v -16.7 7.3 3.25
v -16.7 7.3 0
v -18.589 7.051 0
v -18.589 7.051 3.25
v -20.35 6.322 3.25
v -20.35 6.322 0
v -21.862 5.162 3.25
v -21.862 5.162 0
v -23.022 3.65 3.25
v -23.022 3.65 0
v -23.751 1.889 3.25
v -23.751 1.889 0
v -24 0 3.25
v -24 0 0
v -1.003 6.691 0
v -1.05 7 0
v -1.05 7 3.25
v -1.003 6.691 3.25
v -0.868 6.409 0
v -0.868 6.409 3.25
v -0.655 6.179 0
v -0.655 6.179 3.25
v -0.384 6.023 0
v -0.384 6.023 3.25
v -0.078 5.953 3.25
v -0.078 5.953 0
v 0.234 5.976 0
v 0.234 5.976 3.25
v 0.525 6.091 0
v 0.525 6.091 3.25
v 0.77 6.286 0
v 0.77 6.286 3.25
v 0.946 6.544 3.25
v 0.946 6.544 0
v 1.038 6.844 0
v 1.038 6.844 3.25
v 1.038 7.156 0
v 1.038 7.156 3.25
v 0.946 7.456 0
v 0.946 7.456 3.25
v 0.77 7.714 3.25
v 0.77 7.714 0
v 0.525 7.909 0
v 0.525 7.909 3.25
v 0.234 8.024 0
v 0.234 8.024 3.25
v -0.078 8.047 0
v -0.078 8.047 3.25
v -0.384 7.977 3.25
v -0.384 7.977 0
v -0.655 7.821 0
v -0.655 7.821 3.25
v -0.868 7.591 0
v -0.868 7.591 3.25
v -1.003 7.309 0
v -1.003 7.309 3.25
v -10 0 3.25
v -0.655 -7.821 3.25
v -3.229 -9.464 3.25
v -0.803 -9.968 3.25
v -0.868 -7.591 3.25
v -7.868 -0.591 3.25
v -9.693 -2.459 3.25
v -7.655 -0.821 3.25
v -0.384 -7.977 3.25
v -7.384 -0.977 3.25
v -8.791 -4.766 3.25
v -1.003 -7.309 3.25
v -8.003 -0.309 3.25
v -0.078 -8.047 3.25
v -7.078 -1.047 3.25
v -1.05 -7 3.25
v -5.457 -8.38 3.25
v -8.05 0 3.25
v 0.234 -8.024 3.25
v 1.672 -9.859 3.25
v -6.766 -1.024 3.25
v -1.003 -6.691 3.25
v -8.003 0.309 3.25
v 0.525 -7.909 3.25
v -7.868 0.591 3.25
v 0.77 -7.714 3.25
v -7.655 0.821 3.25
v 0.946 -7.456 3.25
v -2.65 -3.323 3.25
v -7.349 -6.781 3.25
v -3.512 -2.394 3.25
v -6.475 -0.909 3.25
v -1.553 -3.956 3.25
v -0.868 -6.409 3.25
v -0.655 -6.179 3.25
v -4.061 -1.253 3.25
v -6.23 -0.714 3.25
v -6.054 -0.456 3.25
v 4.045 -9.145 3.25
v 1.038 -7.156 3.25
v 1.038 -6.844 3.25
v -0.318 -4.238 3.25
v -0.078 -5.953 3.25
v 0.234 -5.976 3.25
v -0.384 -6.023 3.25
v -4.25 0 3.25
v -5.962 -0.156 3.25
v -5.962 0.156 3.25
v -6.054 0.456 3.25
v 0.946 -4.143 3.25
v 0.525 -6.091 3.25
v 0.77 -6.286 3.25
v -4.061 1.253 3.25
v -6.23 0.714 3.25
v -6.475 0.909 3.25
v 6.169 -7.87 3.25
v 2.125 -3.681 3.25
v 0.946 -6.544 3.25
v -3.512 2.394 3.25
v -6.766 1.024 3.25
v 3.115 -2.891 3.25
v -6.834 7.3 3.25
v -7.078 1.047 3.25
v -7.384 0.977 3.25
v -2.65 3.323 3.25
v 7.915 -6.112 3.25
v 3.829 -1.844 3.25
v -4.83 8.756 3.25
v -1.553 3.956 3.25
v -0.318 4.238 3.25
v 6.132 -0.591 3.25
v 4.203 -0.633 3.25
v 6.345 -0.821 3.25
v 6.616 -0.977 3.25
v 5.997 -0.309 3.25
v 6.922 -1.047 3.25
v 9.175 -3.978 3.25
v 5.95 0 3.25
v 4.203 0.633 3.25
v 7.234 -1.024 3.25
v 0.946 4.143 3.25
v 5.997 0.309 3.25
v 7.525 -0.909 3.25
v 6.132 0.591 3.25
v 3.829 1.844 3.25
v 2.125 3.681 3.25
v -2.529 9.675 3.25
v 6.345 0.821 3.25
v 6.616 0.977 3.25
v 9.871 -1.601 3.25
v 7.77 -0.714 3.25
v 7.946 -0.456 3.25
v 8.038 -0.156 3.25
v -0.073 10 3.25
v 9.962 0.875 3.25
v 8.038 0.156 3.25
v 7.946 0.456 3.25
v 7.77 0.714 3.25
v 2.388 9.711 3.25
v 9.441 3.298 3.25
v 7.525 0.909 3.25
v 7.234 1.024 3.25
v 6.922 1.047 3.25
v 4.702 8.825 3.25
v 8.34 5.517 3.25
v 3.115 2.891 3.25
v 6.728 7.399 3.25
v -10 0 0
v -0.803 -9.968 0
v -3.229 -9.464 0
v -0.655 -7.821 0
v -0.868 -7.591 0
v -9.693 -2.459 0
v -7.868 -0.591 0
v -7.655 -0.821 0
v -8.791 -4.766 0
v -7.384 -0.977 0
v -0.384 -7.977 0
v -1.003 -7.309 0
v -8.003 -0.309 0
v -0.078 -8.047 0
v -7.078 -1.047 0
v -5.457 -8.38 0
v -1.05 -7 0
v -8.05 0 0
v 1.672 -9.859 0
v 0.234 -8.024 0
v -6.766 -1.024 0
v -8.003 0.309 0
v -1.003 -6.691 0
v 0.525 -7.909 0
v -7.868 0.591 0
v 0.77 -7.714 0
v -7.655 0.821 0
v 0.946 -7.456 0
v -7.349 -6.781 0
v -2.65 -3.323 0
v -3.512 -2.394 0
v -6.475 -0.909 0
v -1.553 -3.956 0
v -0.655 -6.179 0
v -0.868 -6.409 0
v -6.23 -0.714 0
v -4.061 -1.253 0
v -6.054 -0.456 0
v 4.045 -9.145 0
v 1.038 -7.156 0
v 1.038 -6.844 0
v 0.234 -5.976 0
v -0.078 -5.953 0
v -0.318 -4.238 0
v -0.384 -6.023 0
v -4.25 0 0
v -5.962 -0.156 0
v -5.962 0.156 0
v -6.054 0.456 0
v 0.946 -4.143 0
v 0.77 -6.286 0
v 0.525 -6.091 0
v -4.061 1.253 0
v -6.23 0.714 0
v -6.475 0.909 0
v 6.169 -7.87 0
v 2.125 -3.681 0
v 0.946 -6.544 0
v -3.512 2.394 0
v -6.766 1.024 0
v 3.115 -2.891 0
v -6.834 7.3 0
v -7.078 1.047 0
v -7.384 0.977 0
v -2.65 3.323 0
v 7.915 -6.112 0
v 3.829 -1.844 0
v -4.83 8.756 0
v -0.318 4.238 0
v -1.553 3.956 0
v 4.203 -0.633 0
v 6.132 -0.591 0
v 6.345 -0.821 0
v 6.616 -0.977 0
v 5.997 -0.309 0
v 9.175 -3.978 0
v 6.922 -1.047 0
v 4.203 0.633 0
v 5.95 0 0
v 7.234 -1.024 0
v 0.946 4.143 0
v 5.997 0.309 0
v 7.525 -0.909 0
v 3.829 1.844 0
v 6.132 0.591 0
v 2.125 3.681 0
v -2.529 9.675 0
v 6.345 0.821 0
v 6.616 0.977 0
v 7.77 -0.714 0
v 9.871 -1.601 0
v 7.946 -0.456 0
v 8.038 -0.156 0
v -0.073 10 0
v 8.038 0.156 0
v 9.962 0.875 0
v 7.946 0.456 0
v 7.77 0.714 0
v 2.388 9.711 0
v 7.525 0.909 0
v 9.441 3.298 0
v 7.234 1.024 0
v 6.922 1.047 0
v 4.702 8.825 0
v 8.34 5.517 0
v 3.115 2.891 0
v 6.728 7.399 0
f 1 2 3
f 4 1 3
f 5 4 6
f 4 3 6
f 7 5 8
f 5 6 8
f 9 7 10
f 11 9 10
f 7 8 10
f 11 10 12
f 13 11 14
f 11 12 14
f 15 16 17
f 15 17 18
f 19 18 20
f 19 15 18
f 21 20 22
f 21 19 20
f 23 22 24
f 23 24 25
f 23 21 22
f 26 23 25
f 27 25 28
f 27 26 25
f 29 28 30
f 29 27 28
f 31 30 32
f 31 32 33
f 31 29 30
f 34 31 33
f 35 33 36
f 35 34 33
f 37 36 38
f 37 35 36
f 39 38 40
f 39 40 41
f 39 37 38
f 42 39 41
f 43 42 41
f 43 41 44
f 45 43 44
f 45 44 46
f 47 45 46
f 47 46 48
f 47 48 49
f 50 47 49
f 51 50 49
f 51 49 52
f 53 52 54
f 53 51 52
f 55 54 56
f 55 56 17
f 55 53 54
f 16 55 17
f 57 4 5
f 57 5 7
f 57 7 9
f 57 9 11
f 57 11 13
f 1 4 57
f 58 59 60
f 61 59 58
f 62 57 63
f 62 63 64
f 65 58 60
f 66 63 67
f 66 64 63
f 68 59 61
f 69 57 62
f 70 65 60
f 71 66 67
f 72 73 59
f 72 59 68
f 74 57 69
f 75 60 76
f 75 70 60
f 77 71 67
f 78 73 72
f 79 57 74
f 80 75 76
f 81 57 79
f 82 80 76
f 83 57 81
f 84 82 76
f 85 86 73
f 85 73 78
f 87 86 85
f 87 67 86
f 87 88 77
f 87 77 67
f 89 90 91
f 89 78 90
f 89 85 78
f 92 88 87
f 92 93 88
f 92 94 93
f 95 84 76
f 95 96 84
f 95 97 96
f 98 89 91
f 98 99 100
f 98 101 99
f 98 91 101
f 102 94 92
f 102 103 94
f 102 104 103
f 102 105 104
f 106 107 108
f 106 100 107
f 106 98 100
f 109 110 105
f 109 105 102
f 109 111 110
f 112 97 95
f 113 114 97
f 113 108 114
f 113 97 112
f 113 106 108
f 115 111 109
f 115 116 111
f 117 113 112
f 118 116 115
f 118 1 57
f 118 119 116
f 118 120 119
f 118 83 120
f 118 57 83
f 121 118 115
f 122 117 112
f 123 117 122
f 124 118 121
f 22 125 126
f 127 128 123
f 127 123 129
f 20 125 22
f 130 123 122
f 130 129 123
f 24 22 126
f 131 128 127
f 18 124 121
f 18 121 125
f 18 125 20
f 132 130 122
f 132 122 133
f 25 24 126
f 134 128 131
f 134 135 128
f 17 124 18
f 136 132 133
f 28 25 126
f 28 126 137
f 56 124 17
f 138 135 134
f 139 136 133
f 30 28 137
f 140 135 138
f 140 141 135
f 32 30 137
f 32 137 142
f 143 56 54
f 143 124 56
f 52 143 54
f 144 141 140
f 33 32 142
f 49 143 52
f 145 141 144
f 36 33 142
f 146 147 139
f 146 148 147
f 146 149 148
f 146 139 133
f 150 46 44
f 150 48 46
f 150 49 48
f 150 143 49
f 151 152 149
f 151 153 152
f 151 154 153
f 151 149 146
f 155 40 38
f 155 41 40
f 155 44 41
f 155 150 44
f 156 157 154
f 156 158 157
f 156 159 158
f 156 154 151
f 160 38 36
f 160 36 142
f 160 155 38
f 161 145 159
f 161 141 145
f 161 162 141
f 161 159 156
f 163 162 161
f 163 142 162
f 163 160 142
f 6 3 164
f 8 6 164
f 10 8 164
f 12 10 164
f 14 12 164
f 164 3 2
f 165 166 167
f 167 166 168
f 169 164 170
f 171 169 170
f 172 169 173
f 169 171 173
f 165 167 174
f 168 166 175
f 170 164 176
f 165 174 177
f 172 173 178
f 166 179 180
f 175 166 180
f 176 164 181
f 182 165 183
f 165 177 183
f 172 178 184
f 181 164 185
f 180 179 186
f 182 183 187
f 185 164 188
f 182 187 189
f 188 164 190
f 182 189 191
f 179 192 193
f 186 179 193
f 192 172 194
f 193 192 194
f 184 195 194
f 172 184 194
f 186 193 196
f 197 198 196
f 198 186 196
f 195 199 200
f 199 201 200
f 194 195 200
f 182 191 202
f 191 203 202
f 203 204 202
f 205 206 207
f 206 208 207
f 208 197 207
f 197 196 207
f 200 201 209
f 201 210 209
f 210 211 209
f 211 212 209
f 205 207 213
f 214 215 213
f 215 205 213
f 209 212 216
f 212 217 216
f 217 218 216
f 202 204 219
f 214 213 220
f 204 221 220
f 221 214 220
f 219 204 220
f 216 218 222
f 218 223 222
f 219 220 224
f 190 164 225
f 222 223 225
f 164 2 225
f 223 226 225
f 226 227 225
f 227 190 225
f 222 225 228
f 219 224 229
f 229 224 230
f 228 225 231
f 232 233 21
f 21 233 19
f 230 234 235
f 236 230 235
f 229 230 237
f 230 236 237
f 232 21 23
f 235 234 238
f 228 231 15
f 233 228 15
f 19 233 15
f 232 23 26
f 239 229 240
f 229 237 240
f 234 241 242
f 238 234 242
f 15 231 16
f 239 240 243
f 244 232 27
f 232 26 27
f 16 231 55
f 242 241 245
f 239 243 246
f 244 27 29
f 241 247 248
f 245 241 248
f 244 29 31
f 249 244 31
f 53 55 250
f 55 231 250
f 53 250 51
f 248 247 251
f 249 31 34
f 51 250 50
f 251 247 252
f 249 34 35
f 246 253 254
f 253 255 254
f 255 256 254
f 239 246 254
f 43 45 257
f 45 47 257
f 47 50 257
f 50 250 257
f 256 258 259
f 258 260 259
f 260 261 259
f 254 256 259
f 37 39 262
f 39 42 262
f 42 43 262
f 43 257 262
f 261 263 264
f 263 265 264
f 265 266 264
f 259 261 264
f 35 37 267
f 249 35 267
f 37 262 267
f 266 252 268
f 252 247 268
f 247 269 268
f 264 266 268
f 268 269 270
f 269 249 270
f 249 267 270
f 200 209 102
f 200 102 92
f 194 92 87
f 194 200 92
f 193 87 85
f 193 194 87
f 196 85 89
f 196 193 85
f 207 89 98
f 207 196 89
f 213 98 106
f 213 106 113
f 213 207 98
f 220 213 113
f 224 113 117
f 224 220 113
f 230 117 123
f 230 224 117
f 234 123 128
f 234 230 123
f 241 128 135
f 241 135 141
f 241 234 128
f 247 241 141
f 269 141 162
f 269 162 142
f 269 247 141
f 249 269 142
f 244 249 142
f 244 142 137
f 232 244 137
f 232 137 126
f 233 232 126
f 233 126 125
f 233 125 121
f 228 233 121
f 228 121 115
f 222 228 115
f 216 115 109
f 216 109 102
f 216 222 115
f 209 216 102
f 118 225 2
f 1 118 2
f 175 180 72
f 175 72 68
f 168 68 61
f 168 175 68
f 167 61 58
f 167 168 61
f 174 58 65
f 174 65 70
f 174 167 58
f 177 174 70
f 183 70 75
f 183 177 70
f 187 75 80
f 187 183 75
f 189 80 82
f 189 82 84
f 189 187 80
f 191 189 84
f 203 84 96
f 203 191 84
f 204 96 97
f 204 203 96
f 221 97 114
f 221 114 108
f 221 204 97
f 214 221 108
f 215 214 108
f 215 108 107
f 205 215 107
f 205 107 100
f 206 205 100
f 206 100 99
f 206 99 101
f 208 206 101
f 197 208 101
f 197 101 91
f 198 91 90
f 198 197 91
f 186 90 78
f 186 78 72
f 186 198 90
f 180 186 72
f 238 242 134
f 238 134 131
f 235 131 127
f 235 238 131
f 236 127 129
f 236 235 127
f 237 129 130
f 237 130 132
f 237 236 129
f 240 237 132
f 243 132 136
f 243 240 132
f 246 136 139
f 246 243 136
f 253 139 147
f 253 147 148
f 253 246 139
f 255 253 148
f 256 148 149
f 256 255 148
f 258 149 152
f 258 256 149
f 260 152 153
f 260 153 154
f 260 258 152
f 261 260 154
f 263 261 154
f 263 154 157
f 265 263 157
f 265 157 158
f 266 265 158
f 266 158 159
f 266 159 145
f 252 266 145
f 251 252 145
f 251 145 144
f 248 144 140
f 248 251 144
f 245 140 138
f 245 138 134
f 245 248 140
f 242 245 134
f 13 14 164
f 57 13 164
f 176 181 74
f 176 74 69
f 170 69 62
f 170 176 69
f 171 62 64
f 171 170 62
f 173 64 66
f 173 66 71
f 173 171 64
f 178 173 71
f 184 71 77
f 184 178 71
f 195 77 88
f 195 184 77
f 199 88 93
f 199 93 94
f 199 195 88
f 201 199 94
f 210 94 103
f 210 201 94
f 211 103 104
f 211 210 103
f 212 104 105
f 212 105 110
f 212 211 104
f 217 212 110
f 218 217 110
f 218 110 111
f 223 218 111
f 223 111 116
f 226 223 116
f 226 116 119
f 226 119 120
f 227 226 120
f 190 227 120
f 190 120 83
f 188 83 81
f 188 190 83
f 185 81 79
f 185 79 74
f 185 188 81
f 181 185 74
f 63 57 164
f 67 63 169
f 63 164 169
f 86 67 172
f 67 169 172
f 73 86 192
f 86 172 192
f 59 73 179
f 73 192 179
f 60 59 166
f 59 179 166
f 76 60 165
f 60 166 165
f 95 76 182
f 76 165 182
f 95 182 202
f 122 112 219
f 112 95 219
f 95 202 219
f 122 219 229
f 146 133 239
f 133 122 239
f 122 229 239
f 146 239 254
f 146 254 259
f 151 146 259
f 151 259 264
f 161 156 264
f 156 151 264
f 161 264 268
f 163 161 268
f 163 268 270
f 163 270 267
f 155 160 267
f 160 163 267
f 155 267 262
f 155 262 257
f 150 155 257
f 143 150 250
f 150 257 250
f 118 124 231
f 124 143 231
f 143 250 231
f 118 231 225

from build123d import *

# Parameters (mm, degrees)
SKETCH2_R           = 10
SKETCH2_R_2         = 1.05
SKETCH2_R_3         = 4.25
BOSS_EXTRUDE2_DEPTH = 3.25


with BuildPart() as part:
    # Sketch2 → Boss-Extrude2 (new body)
    # profile 1 of 2: a face of its own
    with BuildSketch(Plane.XY):
        with BuildLine():
            Line((-24, 0), (-10, 0))
            ThreePointArc((-10, 0), (-9.17454943, 3.978397008), (-6.83447145, 7.3))
            Line((-6.83447145, 7.3), (-16.7, 7.3))
            ThreePointArc((-16.7, 7.3), (-21.861879503, 5.161879503), (-24, 0))
        make_face()
    # profile 2 of 2: a face of its own
    with BuildSketch(Plane.XY):
        Circle(SKETCH2_R)
        with Locations(Location((0, -7, 0), (0, 0, 180))):
            Circle(SKETCH2_R_2, mode=Mode.SUBTRACT)
        with Locations(Location((-7, 0, 0), (0, 0, 180))):
            Circle(SKETCH2_R_2, mode=Mode.SUBTRACT)
        with Locations(Location((0, 7, 0), (0, 0, 180))):
            Circle(SKETCH2_R_2, mode=Mode.SUBTRACT)
        with Locations(Location((7, 0, 0), (0, 0, 180))):
            Circle(SKETCH2_R_2, mode=Mode.SUBTRACT)
        with Locations(Location((0, 0, 0), (0, 0, 180))):
            Circle(SKETCH2_R_3, mode=Mode.SUBTRACT)
    extrude(amount=BOSS_EXTRUDE2_DEPTH)


solid = part.part
